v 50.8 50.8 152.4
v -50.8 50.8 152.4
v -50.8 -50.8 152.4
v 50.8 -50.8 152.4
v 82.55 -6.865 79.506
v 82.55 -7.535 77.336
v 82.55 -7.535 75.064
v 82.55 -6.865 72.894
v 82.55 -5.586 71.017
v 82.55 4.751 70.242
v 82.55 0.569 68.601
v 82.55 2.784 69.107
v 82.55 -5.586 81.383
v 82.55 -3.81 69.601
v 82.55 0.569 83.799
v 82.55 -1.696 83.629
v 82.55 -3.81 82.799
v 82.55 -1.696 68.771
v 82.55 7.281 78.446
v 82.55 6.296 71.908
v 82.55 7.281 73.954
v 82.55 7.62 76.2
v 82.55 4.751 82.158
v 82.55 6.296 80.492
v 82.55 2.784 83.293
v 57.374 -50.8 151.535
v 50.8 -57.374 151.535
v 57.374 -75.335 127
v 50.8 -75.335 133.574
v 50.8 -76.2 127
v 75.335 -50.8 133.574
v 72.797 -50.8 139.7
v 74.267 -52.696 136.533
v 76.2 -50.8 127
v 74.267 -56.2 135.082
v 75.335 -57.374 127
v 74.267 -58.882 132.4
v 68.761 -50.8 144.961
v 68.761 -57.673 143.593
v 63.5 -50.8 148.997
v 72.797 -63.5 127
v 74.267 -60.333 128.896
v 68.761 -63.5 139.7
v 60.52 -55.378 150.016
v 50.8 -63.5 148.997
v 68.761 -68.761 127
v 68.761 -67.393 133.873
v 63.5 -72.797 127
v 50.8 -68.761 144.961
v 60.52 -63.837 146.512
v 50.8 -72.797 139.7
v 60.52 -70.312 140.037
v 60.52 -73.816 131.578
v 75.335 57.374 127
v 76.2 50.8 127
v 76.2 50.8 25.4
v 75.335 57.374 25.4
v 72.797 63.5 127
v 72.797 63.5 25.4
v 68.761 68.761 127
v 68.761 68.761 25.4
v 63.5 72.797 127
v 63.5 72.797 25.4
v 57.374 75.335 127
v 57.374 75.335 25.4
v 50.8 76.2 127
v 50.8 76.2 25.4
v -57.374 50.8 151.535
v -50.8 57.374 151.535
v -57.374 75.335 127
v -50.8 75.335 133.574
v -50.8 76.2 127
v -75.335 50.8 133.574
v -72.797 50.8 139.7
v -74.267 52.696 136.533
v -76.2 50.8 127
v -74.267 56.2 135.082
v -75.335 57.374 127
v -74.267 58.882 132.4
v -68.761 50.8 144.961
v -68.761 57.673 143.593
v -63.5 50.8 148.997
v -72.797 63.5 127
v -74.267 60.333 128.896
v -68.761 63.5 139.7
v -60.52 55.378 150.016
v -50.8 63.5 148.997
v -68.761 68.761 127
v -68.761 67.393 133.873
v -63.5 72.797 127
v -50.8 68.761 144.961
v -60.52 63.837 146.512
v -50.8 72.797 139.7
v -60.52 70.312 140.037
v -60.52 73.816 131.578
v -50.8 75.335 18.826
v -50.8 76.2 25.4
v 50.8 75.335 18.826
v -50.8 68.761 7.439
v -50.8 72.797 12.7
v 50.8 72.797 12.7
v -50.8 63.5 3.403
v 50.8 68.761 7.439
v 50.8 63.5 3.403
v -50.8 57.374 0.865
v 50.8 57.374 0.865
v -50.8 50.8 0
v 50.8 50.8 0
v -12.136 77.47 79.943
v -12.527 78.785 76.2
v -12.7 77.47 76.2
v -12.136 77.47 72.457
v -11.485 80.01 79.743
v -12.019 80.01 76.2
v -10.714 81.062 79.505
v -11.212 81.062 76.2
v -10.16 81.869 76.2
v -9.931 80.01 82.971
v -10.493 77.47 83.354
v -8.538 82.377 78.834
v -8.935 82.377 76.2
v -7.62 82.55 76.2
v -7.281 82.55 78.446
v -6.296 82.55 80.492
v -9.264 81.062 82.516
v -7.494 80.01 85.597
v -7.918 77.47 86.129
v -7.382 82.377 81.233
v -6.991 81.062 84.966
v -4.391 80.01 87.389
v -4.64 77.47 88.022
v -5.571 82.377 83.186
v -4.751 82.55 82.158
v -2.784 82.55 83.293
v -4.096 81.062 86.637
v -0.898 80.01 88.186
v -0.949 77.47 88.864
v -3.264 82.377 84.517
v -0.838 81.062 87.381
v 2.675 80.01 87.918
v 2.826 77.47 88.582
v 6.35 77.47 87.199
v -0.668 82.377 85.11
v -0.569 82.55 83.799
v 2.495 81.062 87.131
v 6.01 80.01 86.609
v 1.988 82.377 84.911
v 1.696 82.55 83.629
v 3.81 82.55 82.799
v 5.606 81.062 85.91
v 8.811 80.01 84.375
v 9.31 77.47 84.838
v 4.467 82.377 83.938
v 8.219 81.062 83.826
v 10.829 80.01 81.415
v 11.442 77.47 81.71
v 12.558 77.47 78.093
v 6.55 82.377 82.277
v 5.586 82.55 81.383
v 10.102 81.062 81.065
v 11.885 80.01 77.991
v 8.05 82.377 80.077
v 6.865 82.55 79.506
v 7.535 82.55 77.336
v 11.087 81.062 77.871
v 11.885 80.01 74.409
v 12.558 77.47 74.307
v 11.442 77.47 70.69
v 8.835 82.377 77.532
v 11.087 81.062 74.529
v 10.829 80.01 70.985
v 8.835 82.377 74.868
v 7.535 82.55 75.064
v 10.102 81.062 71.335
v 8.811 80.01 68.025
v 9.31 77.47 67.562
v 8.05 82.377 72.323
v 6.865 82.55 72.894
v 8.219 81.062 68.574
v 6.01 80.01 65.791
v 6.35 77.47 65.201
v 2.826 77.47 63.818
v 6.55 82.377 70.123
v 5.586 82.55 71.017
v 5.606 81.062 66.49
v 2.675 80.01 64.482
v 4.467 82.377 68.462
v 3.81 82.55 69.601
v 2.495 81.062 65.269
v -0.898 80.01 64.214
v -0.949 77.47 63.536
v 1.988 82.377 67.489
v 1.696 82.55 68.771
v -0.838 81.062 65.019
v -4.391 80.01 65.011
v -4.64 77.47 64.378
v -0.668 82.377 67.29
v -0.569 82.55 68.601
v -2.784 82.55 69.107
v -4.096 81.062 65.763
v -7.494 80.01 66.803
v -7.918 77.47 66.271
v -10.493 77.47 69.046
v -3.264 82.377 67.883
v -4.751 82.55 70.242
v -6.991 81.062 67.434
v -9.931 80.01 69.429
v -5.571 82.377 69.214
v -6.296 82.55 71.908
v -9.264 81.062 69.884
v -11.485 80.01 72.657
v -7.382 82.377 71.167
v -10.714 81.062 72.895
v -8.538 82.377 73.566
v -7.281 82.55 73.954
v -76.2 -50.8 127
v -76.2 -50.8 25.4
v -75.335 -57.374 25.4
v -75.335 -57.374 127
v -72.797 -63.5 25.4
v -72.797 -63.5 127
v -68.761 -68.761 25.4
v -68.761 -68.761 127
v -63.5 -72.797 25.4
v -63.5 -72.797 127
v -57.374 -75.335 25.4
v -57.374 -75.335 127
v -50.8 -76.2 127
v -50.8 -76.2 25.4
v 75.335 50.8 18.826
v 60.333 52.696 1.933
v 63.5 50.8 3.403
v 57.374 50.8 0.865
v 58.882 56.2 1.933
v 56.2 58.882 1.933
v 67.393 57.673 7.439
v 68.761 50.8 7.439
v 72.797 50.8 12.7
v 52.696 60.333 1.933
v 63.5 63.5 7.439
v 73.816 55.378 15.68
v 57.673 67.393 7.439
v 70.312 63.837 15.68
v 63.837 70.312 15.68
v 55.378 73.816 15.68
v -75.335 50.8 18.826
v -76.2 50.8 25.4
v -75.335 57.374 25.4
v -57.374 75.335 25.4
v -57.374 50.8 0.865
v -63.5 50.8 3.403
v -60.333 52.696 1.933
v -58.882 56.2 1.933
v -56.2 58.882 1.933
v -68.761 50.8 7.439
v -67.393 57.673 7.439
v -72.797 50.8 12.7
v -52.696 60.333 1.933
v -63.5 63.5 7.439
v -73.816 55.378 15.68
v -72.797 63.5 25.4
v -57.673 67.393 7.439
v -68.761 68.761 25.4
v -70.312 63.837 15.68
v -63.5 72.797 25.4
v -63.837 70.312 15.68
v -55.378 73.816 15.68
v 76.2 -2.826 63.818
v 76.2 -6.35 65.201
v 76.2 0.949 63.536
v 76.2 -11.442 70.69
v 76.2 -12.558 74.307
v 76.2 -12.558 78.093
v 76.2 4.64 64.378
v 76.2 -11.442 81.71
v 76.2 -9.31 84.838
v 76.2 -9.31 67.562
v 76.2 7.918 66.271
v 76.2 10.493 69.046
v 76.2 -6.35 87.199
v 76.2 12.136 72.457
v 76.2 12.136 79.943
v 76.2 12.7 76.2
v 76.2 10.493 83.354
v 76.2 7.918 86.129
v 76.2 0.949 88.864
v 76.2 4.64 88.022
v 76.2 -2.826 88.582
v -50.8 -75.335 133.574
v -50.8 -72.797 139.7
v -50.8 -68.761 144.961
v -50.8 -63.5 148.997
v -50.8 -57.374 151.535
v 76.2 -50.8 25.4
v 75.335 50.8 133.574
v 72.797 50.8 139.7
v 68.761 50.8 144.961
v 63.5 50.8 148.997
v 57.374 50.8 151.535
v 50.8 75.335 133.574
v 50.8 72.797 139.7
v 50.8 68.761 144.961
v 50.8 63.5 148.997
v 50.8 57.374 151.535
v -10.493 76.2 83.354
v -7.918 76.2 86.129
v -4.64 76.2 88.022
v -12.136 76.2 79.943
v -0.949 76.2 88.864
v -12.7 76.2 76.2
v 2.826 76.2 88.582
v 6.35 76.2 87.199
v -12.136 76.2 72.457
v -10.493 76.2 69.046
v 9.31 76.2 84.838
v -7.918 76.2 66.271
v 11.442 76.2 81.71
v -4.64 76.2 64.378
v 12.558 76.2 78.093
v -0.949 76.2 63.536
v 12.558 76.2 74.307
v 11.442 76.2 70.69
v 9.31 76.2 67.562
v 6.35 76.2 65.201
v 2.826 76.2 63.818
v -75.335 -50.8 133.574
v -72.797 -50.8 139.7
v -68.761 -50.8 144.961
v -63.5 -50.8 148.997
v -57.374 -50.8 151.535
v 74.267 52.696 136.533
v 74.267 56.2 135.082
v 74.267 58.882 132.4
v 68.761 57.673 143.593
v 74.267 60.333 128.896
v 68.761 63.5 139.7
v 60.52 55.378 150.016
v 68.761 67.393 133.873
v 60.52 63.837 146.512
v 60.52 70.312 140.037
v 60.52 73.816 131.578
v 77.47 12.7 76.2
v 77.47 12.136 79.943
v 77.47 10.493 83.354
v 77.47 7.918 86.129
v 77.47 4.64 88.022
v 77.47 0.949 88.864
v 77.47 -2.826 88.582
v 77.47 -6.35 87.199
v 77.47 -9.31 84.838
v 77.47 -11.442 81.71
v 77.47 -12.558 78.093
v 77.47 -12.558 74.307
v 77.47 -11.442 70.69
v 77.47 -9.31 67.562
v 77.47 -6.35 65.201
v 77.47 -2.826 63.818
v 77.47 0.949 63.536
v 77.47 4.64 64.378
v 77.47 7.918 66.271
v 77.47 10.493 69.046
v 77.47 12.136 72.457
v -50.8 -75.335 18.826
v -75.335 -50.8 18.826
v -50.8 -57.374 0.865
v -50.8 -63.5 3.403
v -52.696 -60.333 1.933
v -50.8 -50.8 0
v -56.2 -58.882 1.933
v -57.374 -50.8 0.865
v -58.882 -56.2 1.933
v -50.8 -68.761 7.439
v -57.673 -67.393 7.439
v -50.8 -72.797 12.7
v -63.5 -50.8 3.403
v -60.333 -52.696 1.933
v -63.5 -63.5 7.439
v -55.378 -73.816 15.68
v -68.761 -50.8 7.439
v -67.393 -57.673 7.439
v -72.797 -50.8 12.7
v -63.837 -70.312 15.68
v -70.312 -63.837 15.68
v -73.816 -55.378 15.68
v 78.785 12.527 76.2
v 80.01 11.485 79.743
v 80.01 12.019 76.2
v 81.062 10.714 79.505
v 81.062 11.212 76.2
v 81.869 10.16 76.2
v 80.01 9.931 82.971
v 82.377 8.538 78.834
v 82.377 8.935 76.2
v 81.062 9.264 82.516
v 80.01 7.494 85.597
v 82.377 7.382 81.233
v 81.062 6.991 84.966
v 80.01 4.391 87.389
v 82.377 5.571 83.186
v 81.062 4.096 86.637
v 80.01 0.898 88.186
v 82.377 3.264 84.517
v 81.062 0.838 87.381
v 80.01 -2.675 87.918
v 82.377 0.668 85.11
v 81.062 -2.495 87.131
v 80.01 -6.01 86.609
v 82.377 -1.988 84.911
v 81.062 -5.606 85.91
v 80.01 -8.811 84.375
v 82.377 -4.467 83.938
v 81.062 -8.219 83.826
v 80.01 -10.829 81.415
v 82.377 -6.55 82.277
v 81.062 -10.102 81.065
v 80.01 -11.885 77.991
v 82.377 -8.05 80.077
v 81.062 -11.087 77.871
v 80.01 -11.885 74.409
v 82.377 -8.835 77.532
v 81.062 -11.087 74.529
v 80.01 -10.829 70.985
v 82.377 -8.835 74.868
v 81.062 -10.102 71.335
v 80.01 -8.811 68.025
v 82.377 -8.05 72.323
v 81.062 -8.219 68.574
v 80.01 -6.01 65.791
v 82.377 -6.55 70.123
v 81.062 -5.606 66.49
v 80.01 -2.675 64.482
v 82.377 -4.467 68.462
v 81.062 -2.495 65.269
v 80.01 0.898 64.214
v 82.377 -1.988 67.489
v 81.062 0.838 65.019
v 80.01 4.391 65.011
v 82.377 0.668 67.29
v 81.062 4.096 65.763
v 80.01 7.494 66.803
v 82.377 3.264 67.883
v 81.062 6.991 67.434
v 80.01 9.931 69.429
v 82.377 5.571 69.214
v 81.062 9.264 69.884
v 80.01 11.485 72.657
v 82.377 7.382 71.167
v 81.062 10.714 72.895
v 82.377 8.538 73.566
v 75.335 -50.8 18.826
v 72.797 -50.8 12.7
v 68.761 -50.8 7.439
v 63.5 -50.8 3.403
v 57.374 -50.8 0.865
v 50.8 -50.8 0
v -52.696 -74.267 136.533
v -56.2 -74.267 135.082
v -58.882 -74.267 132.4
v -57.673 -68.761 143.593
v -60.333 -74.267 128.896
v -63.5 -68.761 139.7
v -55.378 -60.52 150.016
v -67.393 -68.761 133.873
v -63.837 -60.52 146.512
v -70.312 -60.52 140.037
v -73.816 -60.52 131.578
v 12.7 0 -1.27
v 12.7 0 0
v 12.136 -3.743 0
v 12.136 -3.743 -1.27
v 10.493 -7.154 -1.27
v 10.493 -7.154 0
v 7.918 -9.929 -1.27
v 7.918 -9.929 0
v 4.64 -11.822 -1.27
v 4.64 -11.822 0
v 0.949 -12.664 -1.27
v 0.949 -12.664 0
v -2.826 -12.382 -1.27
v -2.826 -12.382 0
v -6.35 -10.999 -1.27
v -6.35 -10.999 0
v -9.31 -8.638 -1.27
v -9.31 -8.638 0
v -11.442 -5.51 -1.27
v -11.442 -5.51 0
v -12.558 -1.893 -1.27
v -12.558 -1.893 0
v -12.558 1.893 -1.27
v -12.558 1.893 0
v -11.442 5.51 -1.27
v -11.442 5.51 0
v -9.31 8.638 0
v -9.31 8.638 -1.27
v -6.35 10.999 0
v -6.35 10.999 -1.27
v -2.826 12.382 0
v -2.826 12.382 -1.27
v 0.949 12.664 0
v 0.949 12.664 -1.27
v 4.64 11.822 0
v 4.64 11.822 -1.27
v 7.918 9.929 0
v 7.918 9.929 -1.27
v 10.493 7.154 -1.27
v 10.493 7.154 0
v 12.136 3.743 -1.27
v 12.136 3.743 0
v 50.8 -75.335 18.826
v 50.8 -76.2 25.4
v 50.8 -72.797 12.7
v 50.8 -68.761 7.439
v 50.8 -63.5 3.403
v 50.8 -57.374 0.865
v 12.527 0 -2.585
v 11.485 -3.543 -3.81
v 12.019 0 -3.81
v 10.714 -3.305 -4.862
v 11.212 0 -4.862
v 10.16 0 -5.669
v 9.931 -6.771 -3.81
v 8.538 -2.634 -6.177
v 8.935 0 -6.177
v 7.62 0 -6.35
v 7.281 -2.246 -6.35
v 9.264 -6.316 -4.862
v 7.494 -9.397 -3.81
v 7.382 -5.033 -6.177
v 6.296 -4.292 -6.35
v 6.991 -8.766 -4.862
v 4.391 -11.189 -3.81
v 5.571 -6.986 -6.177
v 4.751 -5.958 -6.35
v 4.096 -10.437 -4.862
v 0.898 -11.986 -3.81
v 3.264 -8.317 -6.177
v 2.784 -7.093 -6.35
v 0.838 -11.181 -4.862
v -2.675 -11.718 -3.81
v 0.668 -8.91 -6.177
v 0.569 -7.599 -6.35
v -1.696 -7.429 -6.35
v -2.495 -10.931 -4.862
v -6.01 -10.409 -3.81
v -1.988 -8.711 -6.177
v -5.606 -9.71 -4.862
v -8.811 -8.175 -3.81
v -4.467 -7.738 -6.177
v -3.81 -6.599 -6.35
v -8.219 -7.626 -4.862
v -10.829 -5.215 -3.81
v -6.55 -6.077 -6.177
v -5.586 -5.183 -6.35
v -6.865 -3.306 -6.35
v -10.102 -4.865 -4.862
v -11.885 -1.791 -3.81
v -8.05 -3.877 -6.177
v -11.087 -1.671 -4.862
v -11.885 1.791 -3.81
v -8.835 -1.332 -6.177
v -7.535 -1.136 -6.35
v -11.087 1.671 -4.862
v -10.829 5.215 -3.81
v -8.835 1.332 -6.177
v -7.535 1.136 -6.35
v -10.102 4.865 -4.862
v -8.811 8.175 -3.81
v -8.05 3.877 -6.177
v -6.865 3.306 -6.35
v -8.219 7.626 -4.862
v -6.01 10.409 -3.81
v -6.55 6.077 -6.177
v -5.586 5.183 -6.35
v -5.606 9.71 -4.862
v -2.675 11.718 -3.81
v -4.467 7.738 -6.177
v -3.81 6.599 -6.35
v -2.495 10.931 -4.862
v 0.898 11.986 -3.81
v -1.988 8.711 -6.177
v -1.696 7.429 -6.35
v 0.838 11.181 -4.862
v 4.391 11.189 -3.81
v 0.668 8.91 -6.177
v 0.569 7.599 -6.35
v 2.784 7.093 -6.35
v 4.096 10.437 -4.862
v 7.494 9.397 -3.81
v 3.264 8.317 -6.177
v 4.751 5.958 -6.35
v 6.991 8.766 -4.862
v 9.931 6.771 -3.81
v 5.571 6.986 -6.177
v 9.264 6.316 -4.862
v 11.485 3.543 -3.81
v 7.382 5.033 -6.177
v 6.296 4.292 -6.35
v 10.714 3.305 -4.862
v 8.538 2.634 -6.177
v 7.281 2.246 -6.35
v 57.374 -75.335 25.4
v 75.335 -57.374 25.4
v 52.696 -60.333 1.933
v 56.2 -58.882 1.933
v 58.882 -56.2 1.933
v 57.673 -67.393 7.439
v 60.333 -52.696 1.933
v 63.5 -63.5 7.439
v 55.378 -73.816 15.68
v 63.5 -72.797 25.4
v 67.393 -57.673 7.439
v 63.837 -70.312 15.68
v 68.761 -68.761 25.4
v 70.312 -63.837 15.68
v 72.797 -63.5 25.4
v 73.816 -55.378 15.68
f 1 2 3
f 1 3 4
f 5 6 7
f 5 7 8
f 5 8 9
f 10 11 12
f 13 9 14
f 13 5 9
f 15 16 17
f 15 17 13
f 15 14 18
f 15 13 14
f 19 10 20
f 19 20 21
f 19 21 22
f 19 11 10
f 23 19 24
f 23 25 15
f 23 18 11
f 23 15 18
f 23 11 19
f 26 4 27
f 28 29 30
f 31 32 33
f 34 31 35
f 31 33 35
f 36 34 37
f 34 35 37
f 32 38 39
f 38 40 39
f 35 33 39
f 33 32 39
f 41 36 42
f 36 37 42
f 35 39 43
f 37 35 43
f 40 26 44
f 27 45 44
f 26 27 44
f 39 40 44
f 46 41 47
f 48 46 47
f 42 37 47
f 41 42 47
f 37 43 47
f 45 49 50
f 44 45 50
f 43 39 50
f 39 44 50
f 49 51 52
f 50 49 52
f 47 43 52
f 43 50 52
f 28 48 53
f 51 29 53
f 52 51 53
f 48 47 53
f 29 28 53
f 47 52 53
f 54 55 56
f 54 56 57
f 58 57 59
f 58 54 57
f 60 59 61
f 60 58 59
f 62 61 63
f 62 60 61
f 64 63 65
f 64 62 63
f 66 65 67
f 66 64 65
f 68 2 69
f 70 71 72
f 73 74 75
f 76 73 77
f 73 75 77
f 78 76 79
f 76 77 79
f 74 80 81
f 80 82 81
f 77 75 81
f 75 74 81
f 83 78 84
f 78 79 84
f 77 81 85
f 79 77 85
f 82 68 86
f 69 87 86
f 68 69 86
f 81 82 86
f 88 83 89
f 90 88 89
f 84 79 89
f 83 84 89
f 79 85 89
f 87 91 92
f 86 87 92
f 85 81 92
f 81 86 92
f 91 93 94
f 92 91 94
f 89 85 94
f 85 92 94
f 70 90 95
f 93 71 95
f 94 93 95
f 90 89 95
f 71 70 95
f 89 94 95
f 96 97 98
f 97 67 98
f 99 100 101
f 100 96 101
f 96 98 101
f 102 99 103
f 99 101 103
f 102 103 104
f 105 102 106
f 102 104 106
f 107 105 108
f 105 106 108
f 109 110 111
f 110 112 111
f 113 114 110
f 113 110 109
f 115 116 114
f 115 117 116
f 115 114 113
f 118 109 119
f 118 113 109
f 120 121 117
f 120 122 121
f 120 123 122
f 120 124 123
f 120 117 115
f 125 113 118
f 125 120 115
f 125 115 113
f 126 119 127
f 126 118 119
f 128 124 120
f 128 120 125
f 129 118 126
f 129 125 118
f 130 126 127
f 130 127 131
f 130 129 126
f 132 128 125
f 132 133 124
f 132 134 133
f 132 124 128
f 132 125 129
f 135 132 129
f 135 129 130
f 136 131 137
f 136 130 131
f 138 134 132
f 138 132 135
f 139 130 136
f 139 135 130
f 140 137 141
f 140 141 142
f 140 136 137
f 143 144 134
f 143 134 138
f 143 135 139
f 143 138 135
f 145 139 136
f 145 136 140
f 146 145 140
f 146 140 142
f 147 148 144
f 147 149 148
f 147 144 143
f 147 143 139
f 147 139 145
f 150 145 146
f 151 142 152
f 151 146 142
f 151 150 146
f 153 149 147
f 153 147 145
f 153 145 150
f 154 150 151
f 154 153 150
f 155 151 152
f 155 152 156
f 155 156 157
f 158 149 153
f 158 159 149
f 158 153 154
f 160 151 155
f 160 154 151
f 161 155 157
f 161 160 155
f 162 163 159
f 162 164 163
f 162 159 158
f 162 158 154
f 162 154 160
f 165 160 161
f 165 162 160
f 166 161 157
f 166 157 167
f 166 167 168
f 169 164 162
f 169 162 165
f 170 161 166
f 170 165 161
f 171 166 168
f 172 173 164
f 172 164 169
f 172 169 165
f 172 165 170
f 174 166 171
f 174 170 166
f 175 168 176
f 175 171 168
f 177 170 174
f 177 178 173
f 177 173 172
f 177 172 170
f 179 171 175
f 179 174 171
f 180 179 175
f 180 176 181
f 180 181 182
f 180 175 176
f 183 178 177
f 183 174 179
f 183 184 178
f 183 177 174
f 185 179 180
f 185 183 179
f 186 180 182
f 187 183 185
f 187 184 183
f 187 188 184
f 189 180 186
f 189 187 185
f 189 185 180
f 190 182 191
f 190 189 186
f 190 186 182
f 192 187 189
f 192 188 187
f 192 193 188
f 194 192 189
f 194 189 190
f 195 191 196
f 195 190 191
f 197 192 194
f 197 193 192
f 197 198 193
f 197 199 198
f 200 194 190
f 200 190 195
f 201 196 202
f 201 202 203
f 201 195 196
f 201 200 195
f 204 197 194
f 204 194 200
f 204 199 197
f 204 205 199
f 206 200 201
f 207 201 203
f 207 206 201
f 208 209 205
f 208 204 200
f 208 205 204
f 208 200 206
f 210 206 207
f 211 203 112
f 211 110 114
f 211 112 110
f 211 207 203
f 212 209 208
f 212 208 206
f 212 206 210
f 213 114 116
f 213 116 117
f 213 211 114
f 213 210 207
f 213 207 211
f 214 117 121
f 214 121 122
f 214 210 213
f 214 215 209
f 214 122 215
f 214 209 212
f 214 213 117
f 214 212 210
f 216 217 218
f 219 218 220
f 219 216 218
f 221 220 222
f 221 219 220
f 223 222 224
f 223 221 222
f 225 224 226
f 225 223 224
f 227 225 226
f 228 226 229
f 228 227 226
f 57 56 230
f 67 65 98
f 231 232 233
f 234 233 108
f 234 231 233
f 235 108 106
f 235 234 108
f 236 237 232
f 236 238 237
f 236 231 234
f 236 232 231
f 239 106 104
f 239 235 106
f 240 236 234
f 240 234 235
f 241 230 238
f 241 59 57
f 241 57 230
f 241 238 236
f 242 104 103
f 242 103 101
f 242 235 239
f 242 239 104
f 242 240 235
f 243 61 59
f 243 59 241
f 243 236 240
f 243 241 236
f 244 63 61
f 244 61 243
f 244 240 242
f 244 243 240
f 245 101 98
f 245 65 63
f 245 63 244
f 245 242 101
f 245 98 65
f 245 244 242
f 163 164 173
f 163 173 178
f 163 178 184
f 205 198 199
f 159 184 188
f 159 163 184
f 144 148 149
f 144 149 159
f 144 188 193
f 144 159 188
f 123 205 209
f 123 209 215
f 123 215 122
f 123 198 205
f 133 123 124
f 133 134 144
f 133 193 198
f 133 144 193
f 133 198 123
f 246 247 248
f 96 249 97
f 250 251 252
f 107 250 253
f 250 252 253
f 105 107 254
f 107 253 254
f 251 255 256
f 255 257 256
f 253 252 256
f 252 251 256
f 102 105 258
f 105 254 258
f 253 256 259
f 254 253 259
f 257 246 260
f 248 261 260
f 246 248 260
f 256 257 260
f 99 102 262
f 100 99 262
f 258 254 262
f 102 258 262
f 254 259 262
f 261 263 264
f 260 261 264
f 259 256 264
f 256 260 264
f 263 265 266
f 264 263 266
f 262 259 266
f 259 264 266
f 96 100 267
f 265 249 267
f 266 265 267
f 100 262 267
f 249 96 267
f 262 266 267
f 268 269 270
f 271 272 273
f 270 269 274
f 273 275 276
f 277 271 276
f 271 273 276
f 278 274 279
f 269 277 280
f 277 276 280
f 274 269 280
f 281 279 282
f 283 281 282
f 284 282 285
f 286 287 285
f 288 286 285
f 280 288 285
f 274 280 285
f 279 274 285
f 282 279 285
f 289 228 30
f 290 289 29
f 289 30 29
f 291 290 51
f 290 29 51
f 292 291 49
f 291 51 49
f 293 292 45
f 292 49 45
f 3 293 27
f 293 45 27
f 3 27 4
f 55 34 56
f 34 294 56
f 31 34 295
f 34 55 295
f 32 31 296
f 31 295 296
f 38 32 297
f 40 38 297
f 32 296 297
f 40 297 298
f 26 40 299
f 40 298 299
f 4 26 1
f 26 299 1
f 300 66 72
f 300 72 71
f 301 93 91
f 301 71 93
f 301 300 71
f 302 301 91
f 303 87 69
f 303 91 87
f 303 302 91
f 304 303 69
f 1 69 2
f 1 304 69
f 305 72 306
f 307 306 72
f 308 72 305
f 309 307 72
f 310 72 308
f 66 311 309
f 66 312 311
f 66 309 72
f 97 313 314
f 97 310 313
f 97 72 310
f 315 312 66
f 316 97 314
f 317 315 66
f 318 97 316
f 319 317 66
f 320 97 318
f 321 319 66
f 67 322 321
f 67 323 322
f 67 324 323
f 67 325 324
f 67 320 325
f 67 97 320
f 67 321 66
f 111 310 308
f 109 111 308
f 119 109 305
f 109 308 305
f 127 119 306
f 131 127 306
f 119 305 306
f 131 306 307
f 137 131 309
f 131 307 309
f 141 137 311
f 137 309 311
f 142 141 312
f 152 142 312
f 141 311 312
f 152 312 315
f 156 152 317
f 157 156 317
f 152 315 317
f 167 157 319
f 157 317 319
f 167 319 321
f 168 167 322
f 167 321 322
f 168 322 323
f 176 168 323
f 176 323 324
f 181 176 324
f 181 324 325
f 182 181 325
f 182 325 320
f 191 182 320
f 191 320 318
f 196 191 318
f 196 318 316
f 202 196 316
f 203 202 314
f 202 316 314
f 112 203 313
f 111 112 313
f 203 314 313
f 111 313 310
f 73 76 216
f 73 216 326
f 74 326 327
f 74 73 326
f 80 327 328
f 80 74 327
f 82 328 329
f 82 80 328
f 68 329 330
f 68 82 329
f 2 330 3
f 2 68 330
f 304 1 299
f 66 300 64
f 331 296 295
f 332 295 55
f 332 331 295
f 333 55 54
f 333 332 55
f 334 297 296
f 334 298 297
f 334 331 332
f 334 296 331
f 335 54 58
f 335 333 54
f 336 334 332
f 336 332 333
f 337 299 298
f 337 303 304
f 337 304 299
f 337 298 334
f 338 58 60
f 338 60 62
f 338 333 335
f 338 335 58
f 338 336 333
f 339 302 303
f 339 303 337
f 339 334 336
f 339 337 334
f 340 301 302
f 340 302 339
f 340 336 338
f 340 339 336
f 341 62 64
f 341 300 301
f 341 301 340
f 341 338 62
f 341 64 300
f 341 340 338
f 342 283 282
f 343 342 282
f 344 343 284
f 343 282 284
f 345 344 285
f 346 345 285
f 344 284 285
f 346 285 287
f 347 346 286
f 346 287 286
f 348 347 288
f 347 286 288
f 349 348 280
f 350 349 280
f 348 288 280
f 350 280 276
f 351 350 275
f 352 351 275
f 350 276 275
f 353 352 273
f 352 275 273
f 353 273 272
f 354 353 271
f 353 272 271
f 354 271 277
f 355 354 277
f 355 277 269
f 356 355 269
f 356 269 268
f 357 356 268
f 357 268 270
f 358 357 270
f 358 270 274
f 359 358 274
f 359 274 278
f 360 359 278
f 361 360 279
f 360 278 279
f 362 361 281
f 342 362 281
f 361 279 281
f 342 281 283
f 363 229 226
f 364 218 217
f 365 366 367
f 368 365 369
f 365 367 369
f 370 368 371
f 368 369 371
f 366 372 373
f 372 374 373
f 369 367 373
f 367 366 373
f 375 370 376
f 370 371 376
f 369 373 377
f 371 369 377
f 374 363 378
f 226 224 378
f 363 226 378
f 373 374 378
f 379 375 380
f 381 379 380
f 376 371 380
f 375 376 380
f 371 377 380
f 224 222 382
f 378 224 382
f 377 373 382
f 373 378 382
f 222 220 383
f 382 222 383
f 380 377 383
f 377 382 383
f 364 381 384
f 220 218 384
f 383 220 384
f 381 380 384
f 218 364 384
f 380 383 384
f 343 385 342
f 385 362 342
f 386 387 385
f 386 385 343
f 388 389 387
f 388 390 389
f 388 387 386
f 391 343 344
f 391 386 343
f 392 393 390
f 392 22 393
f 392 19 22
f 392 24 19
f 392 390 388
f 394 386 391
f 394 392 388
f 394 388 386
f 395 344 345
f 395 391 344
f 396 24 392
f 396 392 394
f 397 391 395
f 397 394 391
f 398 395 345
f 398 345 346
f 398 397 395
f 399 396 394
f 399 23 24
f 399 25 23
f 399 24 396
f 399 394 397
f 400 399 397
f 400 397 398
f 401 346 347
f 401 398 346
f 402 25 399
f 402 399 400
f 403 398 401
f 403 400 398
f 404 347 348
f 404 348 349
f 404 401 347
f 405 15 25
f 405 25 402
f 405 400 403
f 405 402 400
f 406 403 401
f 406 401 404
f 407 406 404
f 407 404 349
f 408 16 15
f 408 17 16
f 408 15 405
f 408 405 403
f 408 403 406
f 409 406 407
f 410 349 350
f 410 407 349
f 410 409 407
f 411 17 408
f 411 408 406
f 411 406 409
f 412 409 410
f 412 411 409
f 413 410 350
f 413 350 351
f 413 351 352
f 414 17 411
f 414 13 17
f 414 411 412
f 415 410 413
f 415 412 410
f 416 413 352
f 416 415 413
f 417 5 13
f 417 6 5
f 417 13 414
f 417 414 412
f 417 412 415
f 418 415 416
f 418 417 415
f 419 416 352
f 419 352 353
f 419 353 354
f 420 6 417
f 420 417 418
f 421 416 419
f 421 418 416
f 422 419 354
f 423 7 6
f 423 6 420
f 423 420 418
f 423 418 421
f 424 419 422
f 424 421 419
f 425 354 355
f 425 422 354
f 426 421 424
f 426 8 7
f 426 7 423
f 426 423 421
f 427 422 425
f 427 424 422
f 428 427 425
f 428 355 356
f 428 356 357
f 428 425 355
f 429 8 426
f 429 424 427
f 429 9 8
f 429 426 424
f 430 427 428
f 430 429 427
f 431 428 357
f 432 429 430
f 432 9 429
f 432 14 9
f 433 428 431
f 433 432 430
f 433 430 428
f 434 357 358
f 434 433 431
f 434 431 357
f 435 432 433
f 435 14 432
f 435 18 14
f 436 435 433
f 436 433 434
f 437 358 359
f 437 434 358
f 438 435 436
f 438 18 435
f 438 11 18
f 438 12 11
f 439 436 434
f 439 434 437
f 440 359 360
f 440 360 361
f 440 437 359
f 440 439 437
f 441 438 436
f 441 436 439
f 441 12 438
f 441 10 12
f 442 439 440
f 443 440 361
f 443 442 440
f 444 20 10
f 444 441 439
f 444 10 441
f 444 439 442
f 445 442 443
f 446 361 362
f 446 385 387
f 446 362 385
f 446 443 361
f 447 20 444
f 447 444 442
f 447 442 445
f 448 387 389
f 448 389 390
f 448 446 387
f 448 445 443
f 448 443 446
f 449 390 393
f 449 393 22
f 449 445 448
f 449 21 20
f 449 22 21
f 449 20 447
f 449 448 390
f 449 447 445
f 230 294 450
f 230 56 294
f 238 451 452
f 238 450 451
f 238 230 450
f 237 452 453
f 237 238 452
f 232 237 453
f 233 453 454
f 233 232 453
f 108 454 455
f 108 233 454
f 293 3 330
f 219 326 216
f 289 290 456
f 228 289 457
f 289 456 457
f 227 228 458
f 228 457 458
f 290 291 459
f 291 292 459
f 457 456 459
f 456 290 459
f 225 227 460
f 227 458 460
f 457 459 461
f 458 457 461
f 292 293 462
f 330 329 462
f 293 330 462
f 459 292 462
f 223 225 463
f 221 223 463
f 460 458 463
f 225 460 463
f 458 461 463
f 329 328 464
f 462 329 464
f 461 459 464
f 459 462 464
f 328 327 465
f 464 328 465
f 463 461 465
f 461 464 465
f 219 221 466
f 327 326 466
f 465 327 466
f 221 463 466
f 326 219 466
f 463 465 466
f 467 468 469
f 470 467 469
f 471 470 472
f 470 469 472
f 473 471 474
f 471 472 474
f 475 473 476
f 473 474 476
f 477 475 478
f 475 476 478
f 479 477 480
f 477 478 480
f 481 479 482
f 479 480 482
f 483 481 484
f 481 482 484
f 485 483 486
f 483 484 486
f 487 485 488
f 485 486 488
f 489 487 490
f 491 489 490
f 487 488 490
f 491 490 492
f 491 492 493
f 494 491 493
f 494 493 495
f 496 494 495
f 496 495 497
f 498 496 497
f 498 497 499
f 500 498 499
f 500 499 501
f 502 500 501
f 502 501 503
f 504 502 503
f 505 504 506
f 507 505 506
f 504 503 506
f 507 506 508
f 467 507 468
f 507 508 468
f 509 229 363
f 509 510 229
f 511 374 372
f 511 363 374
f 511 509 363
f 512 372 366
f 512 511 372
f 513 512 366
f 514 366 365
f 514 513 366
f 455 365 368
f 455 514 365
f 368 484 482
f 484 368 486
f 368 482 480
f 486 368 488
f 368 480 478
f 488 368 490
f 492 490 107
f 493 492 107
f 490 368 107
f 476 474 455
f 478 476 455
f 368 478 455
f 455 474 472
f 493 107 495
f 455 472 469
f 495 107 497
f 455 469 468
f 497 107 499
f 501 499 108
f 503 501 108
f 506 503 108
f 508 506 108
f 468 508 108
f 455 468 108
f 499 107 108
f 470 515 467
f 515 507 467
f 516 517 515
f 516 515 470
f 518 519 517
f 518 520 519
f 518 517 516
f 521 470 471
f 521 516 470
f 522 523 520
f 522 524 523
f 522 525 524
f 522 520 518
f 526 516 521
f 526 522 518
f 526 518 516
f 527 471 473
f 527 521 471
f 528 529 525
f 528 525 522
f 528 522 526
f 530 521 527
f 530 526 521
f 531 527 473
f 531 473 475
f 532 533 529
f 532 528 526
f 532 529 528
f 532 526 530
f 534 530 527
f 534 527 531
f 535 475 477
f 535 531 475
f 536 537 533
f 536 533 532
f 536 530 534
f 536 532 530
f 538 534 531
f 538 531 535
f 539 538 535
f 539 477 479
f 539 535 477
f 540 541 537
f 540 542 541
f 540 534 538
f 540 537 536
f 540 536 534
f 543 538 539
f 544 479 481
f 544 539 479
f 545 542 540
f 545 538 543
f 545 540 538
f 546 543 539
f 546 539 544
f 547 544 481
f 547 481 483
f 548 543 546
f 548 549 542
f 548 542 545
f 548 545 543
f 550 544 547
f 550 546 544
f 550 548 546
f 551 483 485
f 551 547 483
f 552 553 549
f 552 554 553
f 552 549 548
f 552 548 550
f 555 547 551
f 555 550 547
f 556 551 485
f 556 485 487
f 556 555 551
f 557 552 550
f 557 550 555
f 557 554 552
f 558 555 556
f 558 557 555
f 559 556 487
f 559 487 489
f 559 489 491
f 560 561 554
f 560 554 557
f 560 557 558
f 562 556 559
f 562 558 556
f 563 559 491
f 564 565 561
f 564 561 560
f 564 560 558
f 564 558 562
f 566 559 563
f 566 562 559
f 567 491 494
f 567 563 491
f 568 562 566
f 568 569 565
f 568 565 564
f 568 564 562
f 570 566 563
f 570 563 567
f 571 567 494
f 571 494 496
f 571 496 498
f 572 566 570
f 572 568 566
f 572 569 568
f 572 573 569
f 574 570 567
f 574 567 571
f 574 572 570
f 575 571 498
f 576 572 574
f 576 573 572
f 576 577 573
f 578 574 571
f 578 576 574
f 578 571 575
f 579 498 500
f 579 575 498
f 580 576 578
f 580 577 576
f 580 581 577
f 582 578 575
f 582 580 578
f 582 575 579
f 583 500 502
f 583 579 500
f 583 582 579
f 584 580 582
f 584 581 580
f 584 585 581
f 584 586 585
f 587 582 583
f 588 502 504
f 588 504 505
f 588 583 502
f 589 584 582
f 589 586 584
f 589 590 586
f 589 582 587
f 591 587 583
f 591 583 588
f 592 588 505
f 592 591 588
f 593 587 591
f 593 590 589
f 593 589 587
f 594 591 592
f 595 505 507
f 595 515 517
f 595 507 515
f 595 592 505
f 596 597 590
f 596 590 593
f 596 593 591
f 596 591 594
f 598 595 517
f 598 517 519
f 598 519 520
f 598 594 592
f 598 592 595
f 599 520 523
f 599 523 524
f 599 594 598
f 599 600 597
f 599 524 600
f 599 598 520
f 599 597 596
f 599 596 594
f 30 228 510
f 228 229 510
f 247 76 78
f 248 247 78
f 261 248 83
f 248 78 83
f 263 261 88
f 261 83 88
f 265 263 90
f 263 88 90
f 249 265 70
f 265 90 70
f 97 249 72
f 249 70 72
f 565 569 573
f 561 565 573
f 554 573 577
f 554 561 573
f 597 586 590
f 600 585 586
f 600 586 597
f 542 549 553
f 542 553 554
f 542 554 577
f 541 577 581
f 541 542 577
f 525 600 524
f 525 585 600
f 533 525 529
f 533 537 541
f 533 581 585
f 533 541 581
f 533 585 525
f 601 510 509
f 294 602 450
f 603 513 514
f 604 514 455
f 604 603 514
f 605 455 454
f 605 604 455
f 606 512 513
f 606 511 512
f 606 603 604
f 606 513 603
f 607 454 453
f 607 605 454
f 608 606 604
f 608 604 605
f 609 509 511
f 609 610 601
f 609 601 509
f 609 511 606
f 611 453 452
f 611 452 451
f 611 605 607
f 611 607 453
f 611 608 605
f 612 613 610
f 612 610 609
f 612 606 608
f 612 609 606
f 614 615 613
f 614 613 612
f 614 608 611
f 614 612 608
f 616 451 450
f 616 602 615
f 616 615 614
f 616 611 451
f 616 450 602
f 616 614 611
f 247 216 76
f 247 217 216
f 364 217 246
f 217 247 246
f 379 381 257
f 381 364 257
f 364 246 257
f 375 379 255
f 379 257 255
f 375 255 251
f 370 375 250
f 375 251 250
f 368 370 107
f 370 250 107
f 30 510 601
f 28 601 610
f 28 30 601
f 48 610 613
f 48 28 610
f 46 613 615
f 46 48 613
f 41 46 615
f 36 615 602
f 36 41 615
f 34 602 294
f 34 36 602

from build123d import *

# Parameters (mm, degrees)
F0_W      = 152.4
F0_H      = 152.4
F1_DEPTH  = 152.4
F2_R      = 25.4
F3_R      = 12.7
F4_DEPTH  = 6.35
F5_R      = 5.08
F6_R      = 12.7
F7_DEPTH  = 6.35
F8_R      = 5.08
F9_R      = 12.7
F10_DEPTH = 6.35
F11_R     = 5.08


with BuildPart() as f1:
    # F0 (on Top) → F1 (new body)
    with BuildSketch(Plane.XY):
        Rectangle(F0_W, F0_H)
    extrude(amount=F1_DEPTH)

    # F2
    f2_edges = [f1.edges().sort_by_distance(p)[0] for p in [
        (0, 76.2, 152.4),
        (-76.2, 0, 152.4),
        (0, -76.2, 152.4),
        (76.2, 0, 152.4),
        (-76.2, -76.2, 76.2),
        (76.2, -76.2, 76.2),
        (0, -76.2, 0),
        (76.2, 76.2, 76.2),
        (76.2, 0, 0),
        (-76.2, 76.2, 76.2),
        (-76.2, 0, 0),
        (0, 76.2, 0),
    ]]
    fillet(f2_edges, radius=F2_R)

    # F3 (on face) → F4 (join)
    with BuildSketch(Plane(origin=(0, 0, 0), x_dir=(1, 0, 0), z_dir=(0, 0, -1))):
        Circle(F3_R)
    extrude(amount=F4_DEPTH)

    # F5
    f5_edges = [f1.edges().sort_by_distance(p)[0] for p in [
        (-12.7, 0, -6.35),
    ]]
    fillet(f5_edges, radius=F5_R)

    # F6 (on face) → F7 (join)
    with BuildSketch(Plane(origin=(0, 76.2, 0), x_dir=(-1, 0, 0), z_dir=(0, 1, 0))):
        with Locations((0, 76.2)):
            Circle(F6_R)
    extrude(amount=F7_DEPTH)

    # F8
    f8_edges = [f1.edges().sort_by_distance(p)[0] for p in [
        (12.7, 82.55, 76.2),
    ]]
    fillet(f8_edges, radius=F8_R)


with BuildPart() as f10:
    # F9 (on face) → F10 (new body)
    with BuildSketch(Plane.YZ.offset(76.2)):
        with Locations((0, 76.2)):
            Circle(F9_R)
    extrude(amount=F10_DEPTH)

    # F11
    f11_edges = [f10.edges().sort_by_distance(p)[0] for p in [
        (82.55, -12.7, 76.2),
    ]]
    fillet(f11_edges, radius=F11_R)


solid = Compound([f1.part, f10.part])
